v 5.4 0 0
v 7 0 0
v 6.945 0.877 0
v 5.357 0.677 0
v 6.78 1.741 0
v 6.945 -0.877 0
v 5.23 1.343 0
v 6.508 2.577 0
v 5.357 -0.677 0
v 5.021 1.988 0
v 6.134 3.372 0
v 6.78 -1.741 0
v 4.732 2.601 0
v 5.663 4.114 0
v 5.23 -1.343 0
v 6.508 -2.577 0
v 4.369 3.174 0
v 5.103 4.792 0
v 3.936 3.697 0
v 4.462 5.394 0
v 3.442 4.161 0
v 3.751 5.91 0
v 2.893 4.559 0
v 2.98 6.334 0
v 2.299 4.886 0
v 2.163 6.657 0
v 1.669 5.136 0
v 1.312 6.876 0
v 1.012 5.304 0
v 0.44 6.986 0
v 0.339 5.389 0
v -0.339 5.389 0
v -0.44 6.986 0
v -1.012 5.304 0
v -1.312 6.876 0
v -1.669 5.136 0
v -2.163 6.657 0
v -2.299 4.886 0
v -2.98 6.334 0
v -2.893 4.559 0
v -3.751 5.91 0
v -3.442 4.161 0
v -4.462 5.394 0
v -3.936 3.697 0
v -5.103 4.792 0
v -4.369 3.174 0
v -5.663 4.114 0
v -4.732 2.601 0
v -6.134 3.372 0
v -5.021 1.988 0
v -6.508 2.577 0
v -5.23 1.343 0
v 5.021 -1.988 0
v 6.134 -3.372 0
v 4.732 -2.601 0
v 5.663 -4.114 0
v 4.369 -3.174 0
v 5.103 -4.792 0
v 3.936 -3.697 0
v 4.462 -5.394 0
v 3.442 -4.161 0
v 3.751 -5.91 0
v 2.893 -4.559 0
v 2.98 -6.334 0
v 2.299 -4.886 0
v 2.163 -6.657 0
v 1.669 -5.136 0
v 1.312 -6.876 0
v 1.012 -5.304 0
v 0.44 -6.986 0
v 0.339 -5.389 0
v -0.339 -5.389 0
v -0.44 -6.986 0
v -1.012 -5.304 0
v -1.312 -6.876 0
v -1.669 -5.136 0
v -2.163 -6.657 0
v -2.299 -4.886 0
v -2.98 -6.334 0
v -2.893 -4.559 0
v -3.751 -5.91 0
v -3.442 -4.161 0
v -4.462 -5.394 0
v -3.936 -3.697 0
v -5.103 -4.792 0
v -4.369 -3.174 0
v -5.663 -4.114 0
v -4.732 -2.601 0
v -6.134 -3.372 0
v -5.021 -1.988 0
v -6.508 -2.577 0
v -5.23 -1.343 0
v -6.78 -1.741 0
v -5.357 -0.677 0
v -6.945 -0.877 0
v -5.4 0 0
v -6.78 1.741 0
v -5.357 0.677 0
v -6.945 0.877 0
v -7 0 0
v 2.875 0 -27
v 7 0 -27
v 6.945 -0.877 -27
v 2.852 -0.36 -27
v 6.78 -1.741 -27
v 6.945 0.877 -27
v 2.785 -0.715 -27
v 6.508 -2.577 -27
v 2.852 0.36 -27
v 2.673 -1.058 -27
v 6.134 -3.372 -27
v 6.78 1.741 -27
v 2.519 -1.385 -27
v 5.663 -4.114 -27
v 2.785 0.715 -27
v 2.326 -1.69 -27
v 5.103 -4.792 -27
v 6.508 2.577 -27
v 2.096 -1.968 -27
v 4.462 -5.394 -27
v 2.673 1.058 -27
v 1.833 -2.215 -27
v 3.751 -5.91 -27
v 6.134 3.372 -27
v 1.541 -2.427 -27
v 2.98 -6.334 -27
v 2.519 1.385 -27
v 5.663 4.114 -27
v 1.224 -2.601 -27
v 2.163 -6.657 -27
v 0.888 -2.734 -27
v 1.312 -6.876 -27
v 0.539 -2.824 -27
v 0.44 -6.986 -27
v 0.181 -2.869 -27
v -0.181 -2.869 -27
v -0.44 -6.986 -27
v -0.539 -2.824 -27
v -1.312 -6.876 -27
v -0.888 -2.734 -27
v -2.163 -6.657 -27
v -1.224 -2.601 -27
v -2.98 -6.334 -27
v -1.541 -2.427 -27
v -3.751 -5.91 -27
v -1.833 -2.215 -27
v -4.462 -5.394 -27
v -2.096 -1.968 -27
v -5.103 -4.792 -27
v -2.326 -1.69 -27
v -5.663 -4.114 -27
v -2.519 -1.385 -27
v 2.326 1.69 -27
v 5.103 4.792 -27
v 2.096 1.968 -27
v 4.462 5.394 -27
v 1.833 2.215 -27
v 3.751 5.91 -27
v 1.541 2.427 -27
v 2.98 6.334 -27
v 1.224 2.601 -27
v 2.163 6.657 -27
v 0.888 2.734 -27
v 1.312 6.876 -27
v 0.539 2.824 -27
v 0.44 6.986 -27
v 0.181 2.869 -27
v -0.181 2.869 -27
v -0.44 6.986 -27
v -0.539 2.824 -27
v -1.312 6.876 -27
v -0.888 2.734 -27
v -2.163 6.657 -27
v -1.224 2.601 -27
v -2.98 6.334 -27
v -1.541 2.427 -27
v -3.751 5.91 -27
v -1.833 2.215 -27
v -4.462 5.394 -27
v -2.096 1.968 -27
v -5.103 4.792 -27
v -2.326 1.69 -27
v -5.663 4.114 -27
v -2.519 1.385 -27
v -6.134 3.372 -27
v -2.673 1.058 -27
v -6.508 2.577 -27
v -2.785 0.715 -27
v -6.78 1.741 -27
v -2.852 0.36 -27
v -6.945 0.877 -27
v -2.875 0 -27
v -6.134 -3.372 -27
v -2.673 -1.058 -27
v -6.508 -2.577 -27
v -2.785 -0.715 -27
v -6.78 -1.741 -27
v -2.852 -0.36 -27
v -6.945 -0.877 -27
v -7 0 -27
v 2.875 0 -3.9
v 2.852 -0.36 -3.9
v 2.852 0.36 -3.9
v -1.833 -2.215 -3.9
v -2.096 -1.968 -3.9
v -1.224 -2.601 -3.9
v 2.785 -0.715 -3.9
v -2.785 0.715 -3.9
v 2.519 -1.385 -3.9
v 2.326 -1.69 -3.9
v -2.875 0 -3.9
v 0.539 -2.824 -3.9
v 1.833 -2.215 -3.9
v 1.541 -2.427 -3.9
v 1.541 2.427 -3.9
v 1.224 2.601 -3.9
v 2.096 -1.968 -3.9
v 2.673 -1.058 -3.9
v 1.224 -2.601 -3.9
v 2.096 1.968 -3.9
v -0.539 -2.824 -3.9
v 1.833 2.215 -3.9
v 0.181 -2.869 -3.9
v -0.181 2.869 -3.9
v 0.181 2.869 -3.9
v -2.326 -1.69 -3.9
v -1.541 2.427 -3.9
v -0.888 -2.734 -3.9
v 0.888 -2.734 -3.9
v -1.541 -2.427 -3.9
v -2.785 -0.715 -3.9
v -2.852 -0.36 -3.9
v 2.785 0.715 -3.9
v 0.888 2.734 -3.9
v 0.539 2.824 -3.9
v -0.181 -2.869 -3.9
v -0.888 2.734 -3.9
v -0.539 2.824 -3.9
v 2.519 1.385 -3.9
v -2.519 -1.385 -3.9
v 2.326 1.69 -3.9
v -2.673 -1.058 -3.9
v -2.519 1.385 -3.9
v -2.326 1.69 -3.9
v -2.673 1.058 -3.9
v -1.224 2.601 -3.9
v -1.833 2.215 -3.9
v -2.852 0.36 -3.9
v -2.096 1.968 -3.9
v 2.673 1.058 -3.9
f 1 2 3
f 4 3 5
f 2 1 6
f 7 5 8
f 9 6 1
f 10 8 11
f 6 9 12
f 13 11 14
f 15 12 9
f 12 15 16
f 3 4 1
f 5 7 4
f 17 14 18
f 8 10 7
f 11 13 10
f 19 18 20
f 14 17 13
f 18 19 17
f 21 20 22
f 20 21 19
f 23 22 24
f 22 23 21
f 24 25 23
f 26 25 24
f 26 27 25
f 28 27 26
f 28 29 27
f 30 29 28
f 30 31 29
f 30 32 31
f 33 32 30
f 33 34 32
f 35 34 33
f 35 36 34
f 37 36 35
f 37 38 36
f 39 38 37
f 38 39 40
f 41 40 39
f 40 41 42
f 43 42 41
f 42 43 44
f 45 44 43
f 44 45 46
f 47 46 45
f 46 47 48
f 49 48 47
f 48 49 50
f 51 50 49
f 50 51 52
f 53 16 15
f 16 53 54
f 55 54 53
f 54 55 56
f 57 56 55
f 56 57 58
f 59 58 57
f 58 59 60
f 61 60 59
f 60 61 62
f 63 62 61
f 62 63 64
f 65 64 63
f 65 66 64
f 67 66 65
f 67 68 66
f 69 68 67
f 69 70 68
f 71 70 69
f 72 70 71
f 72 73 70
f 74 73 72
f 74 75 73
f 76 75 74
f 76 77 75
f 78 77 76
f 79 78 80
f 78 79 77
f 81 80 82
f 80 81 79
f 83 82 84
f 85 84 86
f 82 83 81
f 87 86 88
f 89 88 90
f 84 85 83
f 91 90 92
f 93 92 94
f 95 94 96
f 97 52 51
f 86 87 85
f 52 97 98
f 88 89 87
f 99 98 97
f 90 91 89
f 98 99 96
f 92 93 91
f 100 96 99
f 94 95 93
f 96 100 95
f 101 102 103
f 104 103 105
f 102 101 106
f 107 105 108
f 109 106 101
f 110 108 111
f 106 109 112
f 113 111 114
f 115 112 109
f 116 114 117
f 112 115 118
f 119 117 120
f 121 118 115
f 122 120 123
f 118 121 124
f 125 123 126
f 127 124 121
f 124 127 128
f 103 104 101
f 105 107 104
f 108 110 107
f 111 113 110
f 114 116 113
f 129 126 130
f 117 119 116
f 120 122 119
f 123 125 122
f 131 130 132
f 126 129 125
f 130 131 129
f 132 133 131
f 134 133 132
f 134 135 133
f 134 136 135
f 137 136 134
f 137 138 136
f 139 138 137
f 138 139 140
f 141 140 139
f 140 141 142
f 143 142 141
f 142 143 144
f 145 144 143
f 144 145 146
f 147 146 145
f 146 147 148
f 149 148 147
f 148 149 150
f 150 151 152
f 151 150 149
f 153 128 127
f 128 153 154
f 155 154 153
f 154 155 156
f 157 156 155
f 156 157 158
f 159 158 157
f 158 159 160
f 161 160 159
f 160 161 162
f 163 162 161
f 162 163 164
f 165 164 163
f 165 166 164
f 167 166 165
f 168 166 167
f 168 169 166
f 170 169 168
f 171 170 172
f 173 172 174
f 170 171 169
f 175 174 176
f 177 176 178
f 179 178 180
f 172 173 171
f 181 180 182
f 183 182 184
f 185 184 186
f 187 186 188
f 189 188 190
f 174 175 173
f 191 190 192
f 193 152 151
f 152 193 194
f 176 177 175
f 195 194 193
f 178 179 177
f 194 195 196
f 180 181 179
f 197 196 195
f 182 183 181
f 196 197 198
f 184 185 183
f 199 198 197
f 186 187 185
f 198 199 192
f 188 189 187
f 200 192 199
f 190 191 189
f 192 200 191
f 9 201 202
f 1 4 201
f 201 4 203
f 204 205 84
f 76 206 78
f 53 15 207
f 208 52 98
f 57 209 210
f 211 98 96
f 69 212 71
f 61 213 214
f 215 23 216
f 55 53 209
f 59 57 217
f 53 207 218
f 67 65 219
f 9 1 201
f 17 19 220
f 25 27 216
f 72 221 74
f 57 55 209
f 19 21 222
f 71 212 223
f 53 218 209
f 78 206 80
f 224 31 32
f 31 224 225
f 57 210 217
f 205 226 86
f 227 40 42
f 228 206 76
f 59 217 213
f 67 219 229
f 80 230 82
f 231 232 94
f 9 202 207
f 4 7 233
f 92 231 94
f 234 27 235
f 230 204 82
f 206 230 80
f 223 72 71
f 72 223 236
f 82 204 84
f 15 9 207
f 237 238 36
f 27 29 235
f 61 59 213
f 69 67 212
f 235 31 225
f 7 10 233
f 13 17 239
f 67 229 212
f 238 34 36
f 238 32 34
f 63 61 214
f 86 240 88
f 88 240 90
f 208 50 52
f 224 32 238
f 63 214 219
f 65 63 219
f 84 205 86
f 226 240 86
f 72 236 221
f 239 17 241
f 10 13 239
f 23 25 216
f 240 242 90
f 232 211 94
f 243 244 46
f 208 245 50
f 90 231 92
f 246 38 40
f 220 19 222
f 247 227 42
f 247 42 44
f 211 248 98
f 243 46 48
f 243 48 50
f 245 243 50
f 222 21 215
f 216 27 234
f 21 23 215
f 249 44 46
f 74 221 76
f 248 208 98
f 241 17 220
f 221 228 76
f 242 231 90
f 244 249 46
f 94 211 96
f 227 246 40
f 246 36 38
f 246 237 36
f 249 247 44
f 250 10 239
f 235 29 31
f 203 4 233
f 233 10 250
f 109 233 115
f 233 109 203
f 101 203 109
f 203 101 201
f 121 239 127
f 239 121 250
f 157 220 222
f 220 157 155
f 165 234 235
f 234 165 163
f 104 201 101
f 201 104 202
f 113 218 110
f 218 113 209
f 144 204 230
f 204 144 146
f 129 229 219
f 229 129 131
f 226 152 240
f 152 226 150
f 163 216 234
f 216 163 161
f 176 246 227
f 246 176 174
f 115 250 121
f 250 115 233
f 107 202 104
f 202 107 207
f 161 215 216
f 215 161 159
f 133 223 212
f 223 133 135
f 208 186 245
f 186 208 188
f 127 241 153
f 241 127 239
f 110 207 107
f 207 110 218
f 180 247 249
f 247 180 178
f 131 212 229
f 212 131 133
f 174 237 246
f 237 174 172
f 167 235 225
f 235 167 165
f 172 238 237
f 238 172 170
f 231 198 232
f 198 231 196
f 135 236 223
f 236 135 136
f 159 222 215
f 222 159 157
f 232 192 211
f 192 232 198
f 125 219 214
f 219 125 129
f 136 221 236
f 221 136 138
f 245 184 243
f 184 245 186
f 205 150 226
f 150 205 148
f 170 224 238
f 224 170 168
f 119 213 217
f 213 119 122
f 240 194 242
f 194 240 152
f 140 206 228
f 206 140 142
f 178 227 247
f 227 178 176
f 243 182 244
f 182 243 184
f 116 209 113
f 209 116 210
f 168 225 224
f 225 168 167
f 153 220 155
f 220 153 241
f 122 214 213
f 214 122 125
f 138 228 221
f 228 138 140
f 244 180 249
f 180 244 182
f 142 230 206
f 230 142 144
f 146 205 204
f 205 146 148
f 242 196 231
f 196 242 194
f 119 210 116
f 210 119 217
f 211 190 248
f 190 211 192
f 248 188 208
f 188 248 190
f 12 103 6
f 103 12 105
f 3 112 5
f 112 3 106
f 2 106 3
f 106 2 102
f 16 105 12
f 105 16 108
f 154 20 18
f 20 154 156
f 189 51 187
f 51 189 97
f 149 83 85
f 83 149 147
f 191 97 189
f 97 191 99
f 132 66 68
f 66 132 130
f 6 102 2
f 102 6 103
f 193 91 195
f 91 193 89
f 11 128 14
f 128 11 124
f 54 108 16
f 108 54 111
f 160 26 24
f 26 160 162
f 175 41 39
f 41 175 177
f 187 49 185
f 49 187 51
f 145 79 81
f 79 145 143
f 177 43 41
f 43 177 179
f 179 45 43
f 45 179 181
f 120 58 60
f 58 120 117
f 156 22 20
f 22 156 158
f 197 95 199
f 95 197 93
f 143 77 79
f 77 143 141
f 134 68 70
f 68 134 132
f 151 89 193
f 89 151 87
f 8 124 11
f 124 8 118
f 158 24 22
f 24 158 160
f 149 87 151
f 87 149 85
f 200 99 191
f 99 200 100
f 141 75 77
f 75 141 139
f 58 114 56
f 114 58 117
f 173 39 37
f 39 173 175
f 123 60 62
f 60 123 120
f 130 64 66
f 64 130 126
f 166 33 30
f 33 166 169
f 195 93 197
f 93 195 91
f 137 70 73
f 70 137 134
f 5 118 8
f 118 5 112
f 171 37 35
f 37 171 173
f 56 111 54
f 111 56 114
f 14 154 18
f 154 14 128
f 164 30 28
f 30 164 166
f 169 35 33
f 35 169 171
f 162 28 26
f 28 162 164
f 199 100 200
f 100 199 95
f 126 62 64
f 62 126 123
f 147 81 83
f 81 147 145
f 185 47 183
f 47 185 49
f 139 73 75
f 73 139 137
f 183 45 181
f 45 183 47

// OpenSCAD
$fn = 50;


difference() {
	union() {
		translate(v = [0, 0, -27.0000000000]) {
			cylinder(h = 27, r = 7.0000000000);
		}
		cylinder(h = 0, r = 10.0000000000);
	}
	union() {
		translate(v = [0, 0, 0]) {
			rotate(a = [0, 0, 0]) {
				difference() {
					union() {
						#translate(v = [0, 0, -27.0000000000]) {
							cylinder(h = 27, r = 2.6000000000);
						}
						#translate(v = [0, 0, -3.9000000000]) {
							cylinder(h = 3.9000000000, r = 7.0000000000, r1 = 2.8750000000, r2 = 5.4000000000);
						}
						#translate(v = [0, 0, -27.0000000000]) {
							cylinder(h = 27, r = 2.8750000000);
						}
						#translate(v = [0, 0, -27.0000000000]) {
							cylinder(h = 27, r = 2.6000000000);
						}
					}
					union();
				}
			}
		}
	}
}
